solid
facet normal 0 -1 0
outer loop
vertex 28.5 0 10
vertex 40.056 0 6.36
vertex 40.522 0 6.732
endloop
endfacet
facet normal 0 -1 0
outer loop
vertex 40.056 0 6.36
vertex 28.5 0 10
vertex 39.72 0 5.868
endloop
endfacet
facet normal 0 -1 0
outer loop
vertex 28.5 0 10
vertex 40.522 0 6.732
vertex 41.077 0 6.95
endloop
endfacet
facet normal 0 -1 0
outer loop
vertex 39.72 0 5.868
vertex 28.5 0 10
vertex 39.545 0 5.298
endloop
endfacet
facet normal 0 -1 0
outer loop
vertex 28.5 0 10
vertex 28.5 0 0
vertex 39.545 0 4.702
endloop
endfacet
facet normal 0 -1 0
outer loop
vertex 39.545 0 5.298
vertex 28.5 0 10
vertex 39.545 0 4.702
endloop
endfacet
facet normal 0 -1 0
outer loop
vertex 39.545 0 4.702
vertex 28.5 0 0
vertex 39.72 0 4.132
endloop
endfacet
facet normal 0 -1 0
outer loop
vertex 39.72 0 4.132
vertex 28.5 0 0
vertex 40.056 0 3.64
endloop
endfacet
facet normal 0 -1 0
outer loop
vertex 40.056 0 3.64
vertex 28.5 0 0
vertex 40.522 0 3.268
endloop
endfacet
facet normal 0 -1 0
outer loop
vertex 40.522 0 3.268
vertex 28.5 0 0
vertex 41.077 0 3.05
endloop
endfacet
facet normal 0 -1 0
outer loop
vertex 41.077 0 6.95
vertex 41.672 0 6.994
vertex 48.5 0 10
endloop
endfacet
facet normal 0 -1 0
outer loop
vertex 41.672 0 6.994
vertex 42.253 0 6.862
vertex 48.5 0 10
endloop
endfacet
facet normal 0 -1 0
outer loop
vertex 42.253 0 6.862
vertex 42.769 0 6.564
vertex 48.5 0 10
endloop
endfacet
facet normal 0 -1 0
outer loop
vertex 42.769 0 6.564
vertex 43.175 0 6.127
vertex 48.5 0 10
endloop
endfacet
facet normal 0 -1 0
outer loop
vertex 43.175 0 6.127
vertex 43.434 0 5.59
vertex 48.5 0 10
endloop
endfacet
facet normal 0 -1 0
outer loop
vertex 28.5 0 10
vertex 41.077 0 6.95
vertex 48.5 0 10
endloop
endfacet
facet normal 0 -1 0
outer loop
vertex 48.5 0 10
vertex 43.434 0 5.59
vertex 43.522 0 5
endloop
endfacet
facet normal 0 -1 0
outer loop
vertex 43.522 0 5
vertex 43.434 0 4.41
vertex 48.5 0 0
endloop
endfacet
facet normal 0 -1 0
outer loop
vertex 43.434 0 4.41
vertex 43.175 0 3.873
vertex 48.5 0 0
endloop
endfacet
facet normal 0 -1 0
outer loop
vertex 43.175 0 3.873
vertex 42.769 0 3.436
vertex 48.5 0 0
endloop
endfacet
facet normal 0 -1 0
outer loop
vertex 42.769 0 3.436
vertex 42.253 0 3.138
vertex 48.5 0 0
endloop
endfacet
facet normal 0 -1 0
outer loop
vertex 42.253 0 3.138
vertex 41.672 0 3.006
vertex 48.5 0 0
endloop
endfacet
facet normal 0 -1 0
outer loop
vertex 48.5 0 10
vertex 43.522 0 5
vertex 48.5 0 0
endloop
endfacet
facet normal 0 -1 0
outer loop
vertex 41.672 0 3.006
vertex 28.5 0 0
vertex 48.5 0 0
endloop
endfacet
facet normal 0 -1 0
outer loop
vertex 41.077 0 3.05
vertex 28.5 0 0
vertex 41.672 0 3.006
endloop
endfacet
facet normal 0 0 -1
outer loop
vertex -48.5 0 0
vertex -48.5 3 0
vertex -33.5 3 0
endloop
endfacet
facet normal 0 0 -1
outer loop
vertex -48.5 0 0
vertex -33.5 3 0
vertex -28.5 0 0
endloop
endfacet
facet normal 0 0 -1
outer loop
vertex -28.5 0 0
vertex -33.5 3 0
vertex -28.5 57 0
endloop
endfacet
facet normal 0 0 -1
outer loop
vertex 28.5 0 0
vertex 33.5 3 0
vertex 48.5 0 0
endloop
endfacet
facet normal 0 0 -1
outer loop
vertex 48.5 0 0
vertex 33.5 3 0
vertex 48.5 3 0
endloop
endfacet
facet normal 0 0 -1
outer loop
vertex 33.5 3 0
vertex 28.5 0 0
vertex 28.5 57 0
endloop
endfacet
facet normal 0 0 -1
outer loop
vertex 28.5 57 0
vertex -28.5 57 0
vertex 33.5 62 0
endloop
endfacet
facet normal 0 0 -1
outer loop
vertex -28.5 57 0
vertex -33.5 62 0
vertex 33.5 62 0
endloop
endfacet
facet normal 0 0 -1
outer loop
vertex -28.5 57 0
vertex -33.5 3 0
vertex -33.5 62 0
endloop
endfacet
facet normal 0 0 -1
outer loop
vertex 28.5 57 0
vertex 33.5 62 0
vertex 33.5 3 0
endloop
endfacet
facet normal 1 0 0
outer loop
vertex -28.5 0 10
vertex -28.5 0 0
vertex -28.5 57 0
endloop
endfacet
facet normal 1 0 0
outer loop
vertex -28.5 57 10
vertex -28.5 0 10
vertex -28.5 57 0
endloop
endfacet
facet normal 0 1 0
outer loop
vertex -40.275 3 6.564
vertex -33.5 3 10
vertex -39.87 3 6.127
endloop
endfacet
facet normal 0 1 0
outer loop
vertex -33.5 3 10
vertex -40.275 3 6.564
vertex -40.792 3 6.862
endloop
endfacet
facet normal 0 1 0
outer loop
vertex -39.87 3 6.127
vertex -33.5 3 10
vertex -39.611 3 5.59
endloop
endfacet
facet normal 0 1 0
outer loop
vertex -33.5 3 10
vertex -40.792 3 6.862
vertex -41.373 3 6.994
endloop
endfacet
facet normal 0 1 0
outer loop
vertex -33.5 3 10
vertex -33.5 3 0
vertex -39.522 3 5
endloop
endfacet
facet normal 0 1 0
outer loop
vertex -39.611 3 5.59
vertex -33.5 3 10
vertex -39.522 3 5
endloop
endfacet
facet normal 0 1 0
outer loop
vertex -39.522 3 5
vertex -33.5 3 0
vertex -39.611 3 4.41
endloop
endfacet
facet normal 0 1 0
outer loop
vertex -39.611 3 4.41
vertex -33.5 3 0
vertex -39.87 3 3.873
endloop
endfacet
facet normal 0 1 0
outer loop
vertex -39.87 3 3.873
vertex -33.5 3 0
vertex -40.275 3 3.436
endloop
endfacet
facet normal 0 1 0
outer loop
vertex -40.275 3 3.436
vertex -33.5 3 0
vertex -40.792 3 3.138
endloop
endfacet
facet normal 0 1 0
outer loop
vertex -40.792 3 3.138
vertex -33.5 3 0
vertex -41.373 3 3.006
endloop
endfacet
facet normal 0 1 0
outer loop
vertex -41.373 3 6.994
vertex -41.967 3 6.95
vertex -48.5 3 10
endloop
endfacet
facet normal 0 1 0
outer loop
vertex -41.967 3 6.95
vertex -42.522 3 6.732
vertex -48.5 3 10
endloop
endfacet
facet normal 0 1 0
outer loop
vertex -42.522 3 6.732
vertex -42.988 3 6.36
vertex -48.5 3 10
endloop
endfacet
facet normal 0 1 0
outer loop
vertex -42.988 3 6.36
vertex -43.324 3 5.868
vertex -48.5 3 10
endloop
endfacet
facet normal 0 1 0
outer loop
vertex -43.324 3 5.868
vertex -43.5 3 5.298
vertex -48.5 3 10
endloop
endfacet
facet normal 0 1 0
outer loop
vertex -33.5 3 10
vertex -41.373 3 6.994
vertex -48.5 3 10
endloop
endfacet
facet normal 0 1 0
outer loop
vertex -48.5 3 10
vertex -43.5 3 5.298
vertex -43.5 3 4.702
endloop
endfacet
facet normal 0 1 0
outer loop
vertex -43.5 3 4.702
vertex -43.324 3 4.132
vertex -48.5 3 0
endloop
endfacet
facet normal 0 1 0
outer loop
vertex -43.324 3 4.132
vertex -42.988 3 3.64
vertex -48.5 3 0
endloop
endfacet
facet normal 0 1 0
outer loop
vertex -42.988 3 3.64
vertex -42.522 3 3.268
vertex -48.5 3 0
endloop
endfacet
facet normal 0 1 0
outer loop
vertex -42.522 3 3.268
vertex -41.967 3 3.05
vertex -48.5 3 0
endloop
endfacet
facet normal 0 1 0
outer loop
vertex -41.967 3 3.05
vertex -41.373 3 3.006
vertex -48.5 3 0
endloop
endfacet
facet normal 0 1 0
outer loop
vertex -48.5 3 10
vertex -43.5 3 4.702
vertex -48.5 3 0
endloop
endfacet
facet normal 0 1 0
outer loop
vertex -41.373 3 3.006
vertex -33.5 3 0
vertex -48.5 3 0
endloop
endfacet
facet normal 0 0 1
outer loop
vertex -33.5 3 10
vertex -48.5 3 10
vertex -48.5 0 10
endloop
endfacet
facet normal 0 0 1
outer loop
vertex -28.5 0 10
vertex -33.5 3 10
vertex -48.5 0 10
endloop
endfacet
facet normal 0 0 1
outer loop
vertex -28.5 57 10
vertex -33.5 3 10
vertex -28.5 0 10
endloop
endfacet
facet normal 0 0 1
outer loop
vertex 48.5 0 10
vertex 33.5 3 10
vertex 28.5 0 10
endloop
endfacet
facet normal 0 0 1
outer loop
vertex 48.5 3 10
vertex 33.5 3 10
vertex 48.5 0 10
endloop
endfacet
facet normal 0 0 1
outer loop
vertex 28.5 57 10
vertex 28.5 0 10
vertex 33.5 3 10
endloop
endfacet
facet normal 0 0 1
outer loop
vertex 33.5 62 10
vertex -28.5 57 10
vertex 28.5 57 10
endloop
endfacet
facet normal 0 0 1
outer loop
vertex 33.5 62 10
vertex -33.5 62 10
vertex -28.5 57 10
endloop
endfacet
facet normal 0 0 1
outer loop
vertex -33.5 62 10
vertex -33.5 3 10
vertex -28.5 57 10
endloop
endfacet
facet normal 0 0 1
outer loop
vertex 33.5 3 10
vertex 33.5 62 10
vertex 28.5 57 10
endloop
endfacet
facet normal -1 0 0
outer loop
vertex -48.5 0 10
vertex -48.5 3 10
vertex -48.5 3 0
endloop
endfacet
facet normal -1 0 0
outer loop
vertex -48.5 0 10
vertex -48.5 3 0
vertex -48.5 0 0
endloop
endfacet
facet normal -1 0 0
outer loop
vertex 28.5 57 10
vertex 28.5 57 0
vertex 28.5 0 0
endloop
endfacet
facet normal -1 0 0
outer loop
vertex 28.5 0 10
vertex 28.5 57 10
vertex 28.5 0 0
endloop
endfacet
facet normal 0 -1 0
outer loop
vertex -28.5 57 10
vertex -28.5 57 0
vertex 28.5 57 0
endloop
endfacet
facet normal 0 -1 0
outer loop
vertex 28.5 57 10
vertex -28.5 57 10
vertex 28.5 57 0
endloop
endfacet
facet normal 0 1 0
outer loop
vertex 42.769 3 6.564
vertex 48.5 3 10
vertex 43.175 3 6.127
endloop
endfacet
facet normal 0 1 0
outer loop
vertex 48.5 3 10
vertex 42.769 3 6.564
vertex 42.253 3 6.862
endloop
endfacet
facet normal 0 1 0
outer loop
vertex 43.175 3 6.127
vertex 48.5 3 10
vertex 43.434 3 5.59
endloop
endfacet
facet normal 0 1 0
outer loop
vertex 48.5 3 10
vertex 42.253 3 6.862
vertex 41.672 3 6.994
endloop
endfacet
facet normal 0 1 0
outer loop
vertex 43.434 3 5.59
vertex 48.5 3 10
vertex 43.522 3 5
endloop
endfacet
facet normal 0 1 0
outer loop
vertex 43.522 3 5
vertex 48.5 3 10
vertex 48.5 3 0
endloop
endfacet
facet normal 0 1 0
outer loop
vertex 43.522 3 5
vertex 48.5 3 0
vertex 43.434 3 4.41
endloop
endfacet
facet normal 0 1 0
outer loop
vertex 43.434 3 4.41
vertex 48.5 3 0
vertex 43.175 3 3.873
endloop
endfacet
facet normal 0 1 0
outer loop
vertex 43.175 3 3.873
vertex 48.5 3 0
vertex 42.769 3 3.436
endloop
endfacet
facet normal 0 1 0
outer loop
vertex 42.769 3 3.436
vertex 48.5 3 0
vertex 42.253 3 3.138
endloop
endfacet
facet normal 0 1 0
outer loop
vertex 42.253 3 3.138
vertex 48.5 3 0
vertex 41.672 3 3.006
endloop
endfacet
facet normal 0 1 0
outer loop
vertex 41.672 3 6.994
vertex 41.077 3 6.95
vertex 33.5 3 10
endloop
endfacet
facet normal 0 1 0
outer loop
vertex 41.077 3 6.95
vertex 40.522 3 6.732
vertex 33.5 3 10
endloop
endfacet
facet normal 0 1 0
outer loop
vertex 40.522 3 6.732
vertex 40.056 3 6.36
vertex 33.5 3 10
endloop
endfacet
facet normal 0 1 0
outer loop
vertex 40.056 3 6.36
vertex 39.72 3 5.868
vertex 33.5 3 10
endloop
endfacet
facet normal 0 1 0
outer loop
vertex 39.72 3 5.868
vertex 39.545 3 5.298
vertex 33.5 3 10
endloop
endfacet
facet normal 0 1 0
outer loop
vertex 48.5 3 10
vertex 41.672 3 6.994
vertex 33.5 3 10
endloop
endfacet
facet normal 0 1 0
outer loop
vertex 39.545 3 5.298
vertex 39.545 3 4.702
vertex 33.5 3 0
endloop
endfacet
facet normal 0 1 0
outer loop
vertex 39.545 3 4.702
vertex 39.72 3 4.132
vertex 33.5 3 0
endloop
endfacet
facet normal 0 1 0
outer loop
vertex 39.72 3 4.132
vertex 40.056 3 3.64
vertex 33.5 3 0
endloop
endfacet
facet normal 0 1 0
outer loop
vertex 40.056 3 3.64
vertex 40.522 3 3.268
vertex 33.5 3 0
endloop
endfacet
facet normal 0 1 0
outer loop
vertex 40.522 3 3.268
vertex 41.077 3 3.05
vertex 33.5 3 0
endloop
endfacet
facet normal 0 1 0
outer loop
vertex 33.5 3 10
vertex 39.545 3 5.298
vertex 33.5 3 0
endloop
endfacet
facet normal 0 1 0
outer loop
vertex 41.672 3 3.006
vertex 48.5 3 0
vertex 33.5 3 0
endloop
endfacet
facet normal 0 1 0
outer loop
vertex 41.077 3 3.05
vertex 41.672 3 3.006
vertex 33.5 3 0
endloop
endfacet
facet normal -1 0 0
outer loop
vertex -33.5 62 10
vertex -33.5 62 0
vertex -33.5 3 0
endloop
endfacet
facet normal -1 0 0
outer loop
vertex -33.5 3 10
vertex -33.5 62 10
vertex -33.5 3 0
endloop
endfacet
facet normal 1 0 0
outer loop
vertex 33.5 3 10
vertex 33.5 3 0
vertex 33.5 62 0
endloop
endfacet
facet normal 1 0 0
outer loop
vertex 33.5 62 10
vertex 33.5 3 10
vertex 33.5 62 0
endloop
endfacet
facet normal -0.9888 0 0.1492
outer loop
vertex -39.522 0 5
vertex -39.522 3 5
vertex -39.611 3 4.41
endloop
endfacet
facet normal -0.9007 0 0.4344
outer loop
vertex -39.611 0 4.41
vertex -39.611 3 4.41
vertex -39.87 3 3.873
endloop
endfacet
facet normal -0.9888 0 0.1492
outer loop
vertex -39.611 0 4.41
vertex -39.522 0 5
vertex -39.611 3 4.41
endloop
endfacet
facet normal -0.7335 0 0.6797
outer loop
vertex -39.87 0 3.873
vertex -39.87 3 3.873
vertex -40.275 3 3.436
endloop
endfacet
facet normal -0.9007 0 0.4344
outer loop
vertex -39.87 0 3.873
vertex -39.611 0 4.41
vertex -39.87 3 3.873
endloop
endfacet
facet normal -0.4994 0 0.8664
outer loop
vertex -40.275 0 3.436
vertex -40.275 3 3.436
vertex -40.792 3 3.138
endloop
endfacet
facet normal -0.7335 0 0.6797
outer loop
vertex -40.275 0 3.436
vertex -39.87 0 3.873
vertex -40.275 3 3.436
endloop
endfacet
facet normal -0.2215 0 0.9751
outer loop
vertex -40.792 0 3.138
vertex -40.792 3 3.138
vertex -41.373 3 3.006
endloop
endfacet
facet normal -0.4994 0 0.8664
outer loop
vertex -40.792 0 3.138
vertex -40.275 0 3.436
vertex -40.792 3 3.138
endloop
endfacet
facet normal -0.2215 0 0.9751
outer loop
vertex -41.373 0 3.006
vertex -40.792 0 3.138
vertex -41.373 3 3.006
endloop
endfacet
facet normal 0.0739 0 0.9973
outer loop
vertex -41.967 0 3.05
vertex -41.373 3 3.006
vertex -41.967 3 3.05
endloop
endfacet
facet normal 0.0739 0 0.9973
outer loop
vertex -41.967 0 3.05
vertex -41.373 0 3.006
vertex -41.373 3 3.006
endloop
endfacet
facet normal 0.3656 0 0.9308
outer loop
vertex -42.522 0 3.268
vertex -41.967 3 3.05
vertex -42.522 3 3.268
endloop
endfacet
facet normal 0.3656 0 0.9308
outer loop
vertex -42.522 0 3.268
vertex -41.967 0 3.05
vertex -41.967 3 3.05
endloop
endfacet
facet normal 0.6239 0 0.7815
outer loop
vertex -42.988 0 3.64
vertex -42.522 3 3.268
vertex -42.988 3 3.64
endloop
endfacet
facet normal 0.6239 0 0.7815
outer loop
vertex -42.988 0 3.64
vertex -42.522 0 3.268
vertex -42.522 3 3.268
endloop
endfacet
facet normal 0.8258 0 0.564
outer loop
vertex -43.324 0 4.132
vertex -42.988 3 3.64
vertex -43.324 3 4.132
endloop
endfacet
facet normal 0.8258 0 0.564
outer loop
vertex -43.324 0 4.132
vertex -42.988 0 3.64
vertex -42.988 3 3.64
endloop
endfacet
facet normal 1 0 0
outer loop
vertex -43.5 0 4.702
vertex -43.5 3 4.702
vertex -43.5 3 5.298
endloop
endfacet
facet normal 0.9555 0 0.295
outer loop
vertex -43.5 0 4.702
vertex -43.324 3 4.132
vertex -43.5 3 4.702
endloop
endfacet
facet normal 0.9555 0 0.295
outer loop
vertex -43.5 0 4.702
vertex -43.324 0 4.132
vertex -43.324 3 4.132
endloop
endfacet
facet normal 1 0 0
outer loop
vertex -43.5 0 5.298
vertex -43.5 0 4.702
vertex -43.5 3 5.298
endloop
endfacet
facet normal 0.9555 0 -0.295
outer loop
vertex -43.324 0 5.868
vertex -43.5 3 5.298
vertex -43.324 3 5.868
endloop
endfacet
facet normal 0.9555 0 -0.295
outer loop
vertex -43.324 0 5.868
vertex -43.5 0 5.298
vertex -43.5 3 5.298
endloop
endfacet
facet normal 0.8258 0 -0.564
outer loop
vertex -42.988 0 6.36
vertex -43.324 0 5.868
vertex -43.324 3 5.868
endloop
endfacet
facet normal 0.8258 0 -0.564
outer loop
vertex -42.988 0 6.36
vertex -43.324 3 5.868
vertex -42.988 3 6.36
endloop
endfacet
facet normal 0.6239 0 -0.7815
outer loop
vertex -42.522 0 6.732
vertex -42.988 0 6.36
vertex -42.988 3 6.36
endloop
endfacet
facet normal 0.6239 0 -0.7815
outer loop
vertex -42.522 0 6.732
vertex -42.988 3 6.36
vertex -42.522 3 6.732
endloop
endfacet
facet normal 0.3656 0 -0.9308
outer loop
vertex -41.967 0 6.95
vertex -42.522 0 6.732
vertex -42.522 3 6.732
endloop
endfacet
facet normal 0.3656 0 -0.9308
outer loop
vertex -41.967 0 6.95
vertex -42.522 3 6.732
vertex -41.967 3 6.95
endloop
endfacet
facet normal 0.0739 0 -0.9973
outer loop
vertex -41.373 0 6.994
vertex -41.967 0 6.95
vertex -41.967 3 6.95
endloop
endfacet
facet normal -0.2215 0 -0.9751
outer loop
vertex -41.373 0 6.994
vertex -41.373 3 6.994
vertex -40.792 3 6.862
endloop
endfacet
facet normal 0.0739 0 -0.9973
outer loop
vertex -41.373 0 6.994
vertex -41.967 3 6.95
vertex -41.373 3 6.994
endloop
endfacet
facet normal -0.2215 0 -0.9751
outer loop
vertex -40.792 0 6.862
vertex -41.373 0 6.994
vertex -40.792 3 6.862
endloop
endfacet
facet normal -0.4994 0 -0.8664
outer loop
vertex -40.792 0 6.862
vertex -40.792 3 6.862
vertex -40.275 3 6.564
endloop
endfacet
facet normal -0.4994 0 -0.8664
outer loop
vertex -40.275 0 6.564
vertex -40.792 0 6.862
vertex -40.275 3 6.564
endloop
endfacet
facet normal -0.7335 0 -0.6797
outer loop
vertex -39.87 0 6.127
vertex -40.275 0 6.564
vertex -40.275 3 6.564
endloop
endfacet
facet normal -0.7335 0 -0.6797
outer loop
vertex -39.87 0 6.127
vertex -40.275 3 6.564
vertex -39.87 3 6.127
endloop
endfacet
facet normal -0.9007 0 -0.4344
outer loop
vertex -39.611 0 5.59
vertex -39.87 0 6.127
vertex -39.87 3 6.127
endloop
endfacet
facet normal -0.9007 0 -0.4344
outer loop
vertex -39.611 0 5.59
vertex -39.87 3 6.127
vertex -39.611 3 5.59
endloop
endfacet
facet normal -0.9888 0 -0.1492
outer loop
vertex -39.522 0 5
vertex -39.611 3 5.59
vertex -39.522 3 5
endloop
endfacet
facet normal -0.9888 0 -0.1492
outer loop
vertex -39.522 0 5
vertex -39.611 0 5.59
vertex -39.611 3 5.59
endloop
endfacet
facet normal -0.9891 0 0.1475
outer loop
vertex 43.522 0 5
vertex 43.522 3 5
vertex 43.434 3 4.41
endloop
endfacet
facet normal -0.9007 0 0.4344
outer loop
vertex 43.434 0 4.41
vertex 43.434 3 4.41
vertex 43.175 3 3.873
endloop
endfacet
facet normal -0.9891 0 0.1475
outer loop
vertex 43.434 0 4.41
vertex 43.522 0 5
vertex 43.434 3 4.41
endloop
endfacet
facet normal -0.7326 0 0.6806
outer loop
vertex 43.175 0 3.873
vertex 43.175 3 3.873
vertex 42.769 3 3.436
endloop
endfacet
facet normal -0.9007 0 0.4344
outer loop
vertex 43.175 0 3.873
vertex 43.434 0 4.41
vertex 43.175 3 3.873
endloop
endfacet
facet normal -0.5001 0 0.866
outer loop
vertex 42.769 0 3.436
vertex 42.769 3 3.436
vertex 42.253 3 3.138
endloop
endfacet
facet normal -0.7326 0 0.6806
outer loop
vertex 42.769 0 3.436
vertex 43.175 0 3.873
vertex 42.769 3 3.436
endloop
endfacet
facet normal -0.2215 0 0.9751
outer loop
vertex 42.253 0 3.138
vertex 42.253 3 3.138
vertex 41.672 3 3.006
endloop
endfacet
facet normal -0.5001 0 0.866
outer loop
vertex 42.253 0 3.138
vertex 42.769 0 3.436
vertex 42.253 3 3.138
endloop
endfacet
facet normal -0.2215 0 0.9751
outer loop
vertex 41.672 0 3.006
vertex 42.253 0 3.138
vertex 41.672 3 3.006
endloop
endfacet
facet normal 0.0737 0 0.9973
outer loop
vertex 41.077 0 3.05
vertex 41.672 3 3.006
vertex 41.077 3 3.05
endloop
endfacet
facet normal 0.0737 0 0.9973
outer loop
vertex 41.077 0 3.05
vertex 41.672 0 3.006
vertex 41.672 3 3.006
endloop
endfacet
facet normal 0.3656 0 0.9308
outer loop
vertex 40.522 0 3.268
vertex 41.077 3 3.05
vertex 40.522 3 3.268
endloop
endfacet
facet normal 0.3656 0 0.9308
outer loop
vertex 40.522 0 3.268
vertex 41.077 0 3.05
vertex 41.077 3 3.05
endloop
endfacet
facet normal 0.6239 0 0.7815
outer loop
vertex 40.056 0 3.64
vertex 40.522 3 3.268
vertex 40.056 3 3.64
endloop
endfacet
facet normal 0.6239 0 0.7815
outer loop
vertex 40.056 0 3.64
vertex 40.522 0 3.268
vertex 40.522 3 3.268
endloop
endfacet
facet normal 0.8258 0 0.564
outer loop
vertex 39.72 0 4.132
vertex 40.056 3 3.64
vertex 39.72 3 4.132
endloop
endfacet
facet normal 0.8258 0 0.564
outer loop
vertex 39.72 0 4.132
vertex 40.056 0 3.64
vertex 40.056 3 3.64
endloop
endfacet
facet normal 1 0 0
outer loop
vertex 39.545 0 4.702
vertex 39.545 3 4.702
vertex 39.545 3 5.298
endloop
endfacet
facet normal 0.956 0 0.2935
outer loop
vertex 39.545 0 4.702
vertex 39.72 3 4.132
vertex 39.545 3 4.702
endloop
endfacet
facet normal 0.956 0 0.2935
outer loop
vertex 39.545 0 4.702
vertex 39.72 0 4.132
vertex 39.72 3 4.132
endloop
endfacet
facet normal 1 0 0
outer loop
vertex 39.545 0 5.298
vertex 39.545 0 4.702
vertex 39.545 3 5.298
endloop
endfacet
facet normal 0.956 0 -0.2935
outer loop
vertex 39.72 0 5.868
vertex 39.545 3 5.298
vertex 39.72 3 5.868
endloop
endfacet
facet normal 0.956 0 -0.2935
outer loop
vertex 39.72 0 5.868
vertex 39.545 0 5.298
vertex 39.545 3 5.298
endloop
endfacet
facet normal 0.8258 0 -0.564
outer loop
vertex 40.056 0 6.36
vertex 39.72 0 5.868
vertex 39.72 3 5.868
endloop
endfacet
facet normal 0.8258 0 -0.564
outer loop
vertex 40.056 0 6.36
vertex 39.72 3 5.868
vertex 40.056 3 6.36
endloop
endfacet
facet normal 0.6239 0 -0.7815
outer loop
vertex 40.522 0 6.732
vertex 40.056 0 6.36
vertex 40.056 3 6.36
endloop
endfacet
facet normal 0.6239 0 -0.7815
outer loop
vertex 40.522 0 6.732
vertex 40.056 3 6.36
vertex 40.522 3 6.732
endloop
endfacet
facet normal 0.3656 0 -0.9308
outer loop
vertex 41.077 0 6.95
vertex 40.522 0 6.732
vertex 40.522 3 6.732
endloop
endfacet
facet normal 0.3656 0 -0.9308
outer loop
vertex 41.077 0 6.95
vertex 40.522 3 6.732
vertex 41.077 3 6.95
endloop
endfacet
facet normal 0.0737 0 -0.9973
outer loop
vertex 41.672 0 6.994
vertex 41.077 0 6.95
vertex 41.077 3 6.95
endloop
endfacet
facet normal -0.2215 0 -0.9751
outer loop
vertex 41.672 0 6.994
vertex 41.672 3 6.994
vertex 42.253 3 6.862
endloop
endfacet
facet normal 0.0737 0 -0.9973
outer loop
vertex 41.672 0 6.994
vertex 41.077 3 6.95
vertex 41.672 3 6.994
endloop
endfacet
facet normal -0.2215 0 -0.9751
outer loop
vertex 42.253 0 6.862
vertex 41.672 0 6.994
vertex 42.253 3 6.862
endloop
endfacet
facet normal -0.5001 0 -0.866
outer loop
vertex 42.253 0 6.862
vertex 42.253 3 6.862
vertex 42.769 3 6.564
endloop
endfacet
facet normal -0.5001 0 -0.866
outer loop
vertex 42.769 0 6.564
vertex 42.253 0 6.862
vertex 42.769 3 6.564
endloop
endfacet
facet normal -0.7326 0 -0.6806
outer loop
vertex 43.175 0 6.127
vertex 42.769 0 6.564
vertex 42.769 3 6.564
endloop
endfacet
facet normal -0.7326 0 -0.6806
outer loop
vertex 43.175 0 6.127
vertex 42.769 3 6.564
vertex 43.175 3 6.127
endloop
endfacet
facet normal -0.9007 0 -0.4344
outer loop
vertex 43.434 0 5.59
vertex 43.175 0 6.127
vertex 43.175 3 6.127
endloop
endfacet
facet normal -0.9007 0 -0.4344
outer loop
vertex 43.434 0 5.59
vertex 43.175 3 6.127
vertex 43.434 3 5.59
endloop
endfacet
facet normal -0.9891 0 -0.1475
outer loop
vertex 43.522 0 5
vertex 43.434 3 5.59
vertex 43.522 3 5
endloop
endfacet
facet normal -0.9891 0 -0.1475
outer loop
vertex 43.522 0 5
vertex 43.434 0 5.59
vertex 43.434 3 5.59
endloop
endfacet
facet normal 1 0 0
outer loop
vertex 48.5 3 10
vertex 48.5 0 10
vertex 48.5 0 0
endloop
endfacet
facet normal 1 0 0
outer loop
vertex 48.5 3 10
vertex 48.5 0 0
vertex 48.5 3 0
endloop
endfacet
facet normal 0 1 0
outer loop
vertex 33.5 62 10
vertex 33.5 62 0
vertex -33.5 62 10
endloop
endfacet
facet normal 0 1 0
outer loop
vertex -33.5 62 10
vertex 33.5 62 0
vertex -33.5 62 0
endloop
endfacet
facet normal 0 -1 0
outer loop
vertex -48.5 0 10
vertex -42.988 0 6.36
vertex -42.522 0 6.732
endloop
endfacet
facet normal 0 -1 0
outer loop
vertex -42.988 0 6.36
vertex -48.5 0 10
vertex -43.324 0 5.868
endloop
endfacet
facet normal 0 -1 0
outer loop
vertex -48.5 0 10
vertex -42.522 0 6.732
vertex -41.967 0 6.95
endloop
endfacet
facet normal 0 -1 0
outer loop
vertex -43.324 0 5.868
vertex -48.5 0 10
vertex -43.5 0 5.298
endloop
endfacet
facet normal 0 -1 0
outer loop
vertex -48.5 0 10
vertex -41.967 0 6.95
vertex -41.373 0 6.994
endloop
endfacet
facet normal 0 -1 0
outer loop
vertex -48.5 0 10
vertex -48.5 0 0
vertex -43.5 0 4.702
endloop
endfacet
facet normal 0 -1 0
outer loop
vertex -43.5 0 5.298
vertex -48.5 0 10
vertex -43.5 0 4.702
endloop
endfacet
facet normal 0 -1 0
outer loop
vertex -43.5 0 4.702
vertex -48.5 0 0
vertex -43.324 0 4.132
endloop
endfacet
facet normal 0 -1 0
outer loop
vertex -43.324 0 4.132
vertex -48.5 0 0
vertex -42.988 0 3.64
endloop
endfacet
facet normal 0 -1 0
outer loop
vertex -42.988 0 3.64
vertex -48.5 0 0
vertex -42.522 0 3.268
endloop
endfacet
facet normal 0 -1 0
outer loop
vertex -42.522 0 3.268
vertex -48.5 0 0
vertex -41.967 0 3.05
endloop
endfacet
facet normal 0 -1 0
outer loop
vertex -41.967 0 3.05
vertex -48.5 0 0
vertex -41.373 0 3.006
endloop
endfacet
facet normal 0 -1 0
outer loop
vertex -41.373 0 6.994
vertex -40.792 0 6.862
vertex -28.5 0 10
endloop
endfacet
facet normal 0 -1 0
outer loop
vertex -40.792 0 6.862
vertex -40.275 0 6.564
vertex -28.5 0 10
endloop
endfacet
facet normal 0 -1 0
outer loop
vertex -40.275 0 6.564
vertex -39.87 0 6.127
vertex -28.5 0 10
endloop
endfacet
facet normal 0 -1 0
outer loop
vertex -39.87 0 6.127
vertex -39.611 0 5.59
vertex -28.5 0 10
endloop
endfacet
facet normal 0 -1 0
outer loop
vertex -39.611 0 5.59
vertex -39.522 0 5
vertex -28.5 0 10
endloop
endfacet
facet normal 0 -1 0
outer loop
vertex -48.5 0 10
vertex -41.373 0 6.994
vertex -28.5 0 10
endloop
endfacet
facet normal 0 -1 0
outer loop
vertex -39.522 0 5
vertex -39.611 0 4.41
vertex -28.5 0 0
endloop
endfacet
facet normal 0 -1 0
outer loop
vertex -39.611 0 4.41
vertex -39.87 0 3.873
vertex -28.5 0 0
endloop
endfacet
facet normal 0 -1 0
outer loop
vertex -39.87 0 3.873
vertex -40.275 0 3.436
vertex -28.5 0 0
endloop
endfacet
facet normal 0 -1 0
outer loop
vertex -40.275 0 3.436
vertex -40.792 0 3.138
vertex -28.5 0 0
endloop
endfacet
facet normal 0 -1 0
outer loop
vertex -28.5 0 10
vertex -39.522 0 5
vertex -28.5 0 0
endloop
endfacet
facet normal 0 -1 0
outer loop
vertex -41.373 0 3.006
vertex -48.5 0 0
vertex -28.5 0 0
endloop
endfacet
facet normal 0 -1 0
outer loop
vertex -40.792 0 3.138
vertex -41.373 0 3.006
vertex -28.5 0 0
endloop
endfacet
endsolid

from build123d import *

# Parameters (mm, degrees)
BOSS_EXTRUDE1_DEPTH = 10
SKETCH4_R           = 2
CUT_EXTRUDE2_DEPTH  = 10


with BuildPart() as part:
    # Sketch1 → Boss-Extrude1 (new body)
    with BuildSketch(Plane.XY):
        Polygon((33.476154754, 62), (-33.476154754, 62), (-33.5, 62), (-33.5, 3), (-48.5, 3), (-48.5, 0), (-28.5, 0), (-28.5, 57), (28.5, 57), (28.5, 0), (48.5, 0), (48.5, 3), (33.5, 3), (33.5, 62), align=None)
    extrude(amount=BOSS_EXTRUDE1_DEPTH)

    # Sketch4 → Cut-Extrude2 (cut)
    with BuildSketch(Plane(origin=(0, 0, 0), x_dir=(1, 0, 0), z_dir=(0, 1, 0))):
        with Locations((-41.522360656, -5)):
            Circle(SKETCH4_R)
        with Locations((41.522360656, -5)):
            Circle(SKETCH4_R)
    extrude(amount=CUT_EXTRUDE2_DEPTH, mode=Mode.SUBTRACT)


solid = part.part
